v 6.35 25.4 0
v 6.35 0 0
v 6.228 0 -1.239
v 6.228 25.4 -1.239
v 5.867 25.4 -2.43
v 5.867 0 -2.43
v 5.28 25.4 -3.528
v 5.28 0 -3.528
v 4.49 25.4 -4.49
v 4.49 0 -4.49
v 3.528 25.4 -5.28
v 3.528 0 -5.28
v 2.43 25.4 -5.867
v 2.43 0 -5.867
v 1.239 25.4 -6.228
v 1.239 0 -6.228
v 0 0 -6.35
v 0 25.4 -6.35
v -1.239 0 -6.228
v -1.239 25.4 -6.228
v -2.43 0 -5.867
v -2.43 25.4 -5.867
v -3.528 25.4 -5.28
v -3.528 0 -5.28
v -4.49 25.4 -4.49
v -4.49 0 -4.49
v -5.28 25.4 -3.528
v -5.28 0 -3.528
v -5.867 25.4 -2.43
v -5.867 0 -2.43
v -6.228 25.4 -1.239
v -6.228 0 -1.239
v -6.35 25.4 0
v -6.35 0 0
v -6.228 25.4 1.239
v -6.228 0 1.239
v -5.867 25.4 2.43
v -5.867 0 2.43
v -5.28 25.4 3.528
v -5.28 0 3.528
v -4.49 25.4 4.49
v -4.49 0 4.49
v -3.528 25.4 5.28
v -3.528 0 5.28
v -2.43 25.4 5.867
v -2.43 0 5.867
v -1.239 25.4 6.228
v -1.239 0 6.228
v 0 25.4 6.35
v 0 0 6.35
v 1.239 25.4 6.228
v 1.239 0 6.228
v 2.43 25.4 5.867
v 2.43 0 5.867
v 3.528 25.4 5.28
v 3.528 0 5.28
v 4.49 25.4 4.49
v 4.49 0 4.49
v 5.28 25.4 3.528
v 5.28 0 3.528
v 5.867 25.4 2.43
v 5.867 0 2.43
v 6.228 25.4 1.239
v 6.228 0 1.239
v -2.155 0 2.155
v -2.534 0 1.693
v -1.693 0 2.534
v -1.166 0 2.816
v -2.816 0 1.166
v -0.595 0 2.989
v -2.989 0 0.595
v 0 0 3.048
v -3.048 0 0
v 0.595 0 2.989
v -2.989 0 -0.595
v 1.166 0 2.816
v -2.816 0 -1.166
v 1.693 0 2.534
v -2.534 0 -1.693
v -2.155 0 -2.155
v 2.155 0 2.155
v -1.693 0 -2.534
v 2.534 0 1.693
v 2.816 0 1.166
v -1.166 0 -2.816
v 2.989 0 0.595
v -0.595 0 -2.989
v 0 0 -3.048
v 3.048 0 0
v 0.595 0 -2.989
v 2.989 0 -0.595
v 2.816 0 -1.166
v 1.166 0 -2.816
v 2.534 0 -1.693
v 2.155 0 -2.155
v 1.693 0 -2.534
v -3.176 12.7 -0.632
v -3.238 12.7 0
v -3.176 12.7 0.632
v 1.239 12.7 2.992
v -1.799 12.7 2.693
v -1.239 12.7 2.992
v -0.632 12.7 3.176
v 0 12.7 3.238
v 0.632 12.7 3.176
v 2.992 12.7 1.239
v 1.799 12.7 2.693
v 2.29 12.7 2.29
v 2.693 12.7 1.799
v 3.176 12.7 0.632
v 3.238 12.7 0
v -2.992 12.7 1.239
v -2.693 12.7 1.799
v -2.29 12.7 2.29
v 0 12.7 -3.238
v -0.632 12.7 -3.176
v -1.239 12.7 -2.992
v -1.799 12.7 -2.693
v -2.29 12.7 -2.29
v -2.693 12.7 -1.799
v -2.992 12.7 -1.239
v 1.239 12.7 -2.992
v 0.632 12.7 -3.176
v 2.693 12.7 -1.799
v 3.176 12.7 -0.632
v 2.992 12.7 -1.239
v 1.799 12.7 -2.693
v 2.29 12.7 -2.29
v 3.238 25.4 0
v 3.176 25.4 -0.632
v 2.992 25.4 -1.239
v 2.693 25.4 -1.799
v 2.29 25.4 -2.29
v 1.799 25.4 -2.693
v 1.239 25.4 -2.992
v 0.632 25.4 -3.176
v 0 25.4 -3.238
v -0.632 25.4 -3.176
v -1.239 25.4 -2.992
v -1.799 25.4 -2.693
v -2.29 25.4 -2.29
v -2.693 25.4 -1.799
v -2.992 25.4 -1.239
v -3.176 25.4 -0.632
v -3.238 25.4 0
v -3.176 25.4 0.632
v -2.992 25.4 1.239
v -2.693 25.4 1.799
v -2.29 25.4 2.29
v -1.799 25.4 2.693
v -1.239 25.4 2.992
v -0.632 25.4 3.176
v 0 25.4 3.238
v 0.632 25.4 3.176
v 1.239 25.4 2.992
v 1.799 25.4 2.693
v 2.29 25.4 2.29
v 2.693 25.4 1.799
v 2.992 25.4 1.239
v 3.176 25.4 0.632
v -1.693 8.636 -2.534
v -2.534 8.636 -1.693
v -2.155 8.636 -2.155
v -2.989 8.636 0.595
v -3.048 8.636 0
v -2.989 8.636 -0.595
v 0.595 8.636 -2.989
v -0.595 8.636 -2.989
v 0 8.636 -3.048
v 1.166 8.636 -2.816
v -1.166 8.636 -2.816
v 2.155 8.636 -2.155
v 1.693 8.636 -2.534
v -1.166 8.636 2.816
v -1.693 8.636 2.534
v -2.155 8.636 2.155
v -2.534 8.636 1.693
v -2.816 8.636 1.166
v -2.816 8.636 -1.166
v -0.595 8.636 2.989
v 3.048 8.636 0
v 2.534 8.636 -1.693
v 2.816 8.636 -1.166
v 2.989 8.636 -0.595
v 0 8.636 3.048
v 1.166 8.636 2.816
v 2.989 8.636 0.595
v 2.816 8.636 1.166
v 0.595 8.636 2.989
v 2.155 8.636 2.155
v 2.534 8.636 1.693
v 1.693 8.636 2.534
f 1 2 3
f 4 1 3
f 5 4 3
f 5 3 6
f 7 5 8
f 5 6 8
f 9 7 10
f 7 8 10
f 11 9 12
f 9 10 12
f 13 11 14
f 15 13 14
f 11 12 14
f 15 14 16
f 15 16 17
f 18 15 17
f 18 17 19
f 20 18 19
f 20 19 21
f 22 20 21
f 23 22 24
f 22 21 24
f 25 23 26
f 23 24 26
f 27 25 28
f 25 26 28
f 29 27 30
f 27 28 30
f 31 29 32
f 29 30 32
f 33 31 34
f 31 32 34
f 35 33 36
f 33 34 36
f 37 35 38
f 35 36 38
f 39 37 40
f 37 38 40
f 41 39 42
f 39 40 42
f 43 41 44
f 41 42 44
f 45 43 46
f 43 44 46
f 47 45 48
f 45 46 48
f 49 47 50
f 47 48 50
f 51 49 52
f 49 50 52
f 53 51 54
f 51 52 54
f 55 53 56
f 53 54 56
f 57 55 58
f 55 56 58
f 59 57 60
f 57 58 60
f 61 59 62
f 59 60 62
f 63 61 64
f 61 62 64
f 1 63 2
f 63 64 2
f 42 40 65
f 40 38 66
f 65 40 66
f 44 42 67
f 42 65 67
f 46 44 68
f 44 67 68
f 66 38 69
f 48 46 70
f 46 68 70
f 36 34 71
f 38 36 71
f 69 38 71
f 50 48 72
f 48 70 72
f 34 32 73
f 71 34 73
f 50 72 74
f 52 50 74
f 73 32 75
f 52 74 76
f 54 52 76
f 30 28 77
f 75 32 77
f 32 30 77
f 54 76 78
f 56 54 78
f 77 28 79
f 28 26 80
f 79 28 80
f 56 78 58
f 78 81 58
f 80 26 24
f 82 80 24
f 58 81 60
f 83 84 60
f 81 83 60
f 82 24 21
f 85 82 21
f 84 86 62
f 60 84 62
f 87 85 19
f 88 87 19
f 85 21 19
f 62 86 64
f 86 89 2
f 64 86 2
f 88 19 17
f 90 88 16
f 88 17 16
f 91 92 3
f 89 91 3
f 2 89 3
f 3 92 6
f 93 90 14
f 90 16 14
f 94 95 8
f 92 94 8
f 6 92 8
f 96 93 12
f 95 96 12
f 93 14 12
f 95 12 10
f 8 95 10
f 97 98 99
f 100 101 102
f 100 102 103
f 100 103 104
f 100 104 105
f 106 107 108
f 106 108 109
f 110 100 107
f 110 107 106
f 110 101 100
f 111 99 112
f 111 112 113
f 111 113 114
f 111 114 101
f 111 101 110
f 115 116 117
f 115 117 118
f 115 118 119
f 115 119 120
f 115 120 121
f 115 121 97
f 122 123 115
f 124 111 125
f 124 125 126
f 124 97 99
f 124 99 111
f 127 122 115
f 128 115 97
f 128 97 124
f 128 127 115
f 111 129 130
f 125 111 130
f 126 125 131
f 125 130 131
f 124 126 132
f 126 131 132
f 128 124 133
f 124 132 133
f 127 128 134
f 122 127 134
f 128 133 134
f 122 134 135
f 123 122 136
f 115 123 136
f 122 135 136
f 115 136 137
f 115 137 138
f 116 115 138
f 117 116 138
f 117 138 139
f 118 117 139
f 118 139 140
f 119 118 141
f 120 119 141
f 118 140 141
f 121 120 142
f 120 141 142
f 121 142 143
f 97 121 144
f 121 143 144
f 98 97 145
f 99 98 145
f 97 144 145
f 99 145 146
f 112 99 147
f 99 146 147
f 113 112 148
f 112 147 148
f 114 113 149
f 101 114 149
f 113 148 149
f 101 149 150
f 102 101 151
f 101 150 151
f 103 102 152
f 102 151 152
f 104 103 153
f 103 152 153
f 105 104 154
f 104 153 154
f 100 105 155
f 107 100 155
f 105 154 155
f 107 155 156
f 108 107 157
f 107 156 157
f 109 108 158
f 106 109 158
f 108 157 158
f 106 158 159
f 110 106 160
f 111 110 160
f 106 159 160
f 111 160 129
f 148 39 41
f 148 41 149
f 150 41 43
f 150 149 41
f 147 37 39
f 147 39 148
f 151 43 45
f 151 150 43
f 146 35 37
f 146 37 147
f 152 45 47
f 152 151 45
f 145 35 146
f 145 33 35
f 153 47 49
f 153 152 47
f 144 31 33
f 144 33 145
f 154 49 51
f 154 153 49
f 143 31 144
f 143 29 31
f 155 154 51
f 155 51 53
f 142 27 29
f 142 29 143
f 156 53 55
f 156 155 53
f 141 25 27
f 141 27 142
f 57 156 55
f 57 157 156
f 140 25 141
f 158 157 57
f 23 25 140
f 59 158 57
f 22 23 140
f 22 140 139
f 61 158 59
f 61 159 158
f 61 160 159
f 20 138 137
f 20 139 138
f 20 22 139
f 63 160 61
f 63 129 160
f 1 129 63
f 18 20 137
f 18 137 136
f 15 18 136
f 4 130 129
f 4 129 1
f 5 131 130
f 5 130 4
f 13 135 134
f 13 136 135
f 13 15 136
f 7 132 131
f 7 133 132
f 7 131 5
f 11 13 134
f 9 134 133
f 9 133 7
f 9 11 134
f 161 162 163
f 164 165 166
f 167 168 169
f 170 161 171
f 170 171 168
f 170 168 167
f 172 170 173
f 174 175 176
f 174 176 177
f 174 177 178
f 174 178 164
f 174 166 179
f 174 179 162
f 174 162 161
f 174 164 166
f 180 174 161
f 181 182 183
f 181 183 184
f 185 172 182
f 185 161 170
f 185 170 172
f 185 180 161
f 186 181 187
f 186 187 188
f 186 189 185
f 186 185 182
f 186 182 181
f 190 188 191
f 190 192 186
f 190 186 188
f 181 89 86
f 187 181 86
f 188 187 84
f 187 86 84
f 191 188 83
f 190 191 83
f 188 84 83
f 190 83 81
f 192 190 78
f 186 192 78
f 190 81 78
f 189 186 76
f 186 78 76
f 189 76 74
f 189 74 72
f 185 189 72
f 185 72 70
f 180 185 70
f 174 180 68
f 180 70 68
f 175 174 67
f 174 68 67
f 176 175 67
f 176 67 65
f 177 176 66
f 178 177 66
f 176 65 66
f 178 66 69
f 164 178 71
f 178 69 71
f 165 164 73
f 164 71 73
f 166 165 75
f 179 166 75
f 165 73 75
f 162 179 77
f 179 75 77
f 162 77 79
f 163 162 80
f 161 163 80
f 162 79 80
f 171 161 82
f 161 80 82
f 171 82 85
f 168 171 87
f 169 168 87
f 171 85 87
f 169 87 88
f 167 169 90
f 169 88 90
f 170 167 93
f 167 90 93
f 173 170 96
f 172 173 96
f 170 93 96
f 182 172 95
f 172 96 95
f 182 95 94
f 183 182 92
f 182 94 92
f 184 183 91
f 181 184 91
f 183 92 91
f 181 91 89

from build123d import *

# Parameters (mm, degrees)
SKETCH1_R           = 6.35
BOSS_EXTRUDE1_DEPTH = 25.4
SKETCH2_R           = 3.048
CUT_EXTRUDE1_DEPTH  = 8.636
SKETCH3_R           = 3.2385
CUT_EXTRUDE2_DEPTH  = 12.7


with BuildPart() as part:
    # Sketch1 → Boss-Extrude1 (new body)
    with BuildSketch(Plane(origin=(0, 0, 0), x_dir=(1, 0, 0), z_dir=(0, 1, 0))):
        Circle(SKETCH1_R)
    extrude(amount=BOSS_EXTRUDE1_DEPTH)

    # Sketch2 → Cut-Extrude1 (cut)
    with BuildSketch(Plane.XZ):
        Circle(SKETCH2_R)
    extrude(amount=-CUT_EXTRUDE1_DEPTH, mode=Mode.SUBTRACT)

    # Sketch3 → Cut-Extrude2 (cut)
    with BuildSketch(Plane(origin=(0, 25.4, 0), x_dir=(1, 0, 0), z_dir=(0, 1, 0))):
        Circle(SKETCH3_R)
    extrude(amount=-CUT_EXTRUDE2_DEPTH, mode=Mode.SUBTRACT)


solid = part.part
